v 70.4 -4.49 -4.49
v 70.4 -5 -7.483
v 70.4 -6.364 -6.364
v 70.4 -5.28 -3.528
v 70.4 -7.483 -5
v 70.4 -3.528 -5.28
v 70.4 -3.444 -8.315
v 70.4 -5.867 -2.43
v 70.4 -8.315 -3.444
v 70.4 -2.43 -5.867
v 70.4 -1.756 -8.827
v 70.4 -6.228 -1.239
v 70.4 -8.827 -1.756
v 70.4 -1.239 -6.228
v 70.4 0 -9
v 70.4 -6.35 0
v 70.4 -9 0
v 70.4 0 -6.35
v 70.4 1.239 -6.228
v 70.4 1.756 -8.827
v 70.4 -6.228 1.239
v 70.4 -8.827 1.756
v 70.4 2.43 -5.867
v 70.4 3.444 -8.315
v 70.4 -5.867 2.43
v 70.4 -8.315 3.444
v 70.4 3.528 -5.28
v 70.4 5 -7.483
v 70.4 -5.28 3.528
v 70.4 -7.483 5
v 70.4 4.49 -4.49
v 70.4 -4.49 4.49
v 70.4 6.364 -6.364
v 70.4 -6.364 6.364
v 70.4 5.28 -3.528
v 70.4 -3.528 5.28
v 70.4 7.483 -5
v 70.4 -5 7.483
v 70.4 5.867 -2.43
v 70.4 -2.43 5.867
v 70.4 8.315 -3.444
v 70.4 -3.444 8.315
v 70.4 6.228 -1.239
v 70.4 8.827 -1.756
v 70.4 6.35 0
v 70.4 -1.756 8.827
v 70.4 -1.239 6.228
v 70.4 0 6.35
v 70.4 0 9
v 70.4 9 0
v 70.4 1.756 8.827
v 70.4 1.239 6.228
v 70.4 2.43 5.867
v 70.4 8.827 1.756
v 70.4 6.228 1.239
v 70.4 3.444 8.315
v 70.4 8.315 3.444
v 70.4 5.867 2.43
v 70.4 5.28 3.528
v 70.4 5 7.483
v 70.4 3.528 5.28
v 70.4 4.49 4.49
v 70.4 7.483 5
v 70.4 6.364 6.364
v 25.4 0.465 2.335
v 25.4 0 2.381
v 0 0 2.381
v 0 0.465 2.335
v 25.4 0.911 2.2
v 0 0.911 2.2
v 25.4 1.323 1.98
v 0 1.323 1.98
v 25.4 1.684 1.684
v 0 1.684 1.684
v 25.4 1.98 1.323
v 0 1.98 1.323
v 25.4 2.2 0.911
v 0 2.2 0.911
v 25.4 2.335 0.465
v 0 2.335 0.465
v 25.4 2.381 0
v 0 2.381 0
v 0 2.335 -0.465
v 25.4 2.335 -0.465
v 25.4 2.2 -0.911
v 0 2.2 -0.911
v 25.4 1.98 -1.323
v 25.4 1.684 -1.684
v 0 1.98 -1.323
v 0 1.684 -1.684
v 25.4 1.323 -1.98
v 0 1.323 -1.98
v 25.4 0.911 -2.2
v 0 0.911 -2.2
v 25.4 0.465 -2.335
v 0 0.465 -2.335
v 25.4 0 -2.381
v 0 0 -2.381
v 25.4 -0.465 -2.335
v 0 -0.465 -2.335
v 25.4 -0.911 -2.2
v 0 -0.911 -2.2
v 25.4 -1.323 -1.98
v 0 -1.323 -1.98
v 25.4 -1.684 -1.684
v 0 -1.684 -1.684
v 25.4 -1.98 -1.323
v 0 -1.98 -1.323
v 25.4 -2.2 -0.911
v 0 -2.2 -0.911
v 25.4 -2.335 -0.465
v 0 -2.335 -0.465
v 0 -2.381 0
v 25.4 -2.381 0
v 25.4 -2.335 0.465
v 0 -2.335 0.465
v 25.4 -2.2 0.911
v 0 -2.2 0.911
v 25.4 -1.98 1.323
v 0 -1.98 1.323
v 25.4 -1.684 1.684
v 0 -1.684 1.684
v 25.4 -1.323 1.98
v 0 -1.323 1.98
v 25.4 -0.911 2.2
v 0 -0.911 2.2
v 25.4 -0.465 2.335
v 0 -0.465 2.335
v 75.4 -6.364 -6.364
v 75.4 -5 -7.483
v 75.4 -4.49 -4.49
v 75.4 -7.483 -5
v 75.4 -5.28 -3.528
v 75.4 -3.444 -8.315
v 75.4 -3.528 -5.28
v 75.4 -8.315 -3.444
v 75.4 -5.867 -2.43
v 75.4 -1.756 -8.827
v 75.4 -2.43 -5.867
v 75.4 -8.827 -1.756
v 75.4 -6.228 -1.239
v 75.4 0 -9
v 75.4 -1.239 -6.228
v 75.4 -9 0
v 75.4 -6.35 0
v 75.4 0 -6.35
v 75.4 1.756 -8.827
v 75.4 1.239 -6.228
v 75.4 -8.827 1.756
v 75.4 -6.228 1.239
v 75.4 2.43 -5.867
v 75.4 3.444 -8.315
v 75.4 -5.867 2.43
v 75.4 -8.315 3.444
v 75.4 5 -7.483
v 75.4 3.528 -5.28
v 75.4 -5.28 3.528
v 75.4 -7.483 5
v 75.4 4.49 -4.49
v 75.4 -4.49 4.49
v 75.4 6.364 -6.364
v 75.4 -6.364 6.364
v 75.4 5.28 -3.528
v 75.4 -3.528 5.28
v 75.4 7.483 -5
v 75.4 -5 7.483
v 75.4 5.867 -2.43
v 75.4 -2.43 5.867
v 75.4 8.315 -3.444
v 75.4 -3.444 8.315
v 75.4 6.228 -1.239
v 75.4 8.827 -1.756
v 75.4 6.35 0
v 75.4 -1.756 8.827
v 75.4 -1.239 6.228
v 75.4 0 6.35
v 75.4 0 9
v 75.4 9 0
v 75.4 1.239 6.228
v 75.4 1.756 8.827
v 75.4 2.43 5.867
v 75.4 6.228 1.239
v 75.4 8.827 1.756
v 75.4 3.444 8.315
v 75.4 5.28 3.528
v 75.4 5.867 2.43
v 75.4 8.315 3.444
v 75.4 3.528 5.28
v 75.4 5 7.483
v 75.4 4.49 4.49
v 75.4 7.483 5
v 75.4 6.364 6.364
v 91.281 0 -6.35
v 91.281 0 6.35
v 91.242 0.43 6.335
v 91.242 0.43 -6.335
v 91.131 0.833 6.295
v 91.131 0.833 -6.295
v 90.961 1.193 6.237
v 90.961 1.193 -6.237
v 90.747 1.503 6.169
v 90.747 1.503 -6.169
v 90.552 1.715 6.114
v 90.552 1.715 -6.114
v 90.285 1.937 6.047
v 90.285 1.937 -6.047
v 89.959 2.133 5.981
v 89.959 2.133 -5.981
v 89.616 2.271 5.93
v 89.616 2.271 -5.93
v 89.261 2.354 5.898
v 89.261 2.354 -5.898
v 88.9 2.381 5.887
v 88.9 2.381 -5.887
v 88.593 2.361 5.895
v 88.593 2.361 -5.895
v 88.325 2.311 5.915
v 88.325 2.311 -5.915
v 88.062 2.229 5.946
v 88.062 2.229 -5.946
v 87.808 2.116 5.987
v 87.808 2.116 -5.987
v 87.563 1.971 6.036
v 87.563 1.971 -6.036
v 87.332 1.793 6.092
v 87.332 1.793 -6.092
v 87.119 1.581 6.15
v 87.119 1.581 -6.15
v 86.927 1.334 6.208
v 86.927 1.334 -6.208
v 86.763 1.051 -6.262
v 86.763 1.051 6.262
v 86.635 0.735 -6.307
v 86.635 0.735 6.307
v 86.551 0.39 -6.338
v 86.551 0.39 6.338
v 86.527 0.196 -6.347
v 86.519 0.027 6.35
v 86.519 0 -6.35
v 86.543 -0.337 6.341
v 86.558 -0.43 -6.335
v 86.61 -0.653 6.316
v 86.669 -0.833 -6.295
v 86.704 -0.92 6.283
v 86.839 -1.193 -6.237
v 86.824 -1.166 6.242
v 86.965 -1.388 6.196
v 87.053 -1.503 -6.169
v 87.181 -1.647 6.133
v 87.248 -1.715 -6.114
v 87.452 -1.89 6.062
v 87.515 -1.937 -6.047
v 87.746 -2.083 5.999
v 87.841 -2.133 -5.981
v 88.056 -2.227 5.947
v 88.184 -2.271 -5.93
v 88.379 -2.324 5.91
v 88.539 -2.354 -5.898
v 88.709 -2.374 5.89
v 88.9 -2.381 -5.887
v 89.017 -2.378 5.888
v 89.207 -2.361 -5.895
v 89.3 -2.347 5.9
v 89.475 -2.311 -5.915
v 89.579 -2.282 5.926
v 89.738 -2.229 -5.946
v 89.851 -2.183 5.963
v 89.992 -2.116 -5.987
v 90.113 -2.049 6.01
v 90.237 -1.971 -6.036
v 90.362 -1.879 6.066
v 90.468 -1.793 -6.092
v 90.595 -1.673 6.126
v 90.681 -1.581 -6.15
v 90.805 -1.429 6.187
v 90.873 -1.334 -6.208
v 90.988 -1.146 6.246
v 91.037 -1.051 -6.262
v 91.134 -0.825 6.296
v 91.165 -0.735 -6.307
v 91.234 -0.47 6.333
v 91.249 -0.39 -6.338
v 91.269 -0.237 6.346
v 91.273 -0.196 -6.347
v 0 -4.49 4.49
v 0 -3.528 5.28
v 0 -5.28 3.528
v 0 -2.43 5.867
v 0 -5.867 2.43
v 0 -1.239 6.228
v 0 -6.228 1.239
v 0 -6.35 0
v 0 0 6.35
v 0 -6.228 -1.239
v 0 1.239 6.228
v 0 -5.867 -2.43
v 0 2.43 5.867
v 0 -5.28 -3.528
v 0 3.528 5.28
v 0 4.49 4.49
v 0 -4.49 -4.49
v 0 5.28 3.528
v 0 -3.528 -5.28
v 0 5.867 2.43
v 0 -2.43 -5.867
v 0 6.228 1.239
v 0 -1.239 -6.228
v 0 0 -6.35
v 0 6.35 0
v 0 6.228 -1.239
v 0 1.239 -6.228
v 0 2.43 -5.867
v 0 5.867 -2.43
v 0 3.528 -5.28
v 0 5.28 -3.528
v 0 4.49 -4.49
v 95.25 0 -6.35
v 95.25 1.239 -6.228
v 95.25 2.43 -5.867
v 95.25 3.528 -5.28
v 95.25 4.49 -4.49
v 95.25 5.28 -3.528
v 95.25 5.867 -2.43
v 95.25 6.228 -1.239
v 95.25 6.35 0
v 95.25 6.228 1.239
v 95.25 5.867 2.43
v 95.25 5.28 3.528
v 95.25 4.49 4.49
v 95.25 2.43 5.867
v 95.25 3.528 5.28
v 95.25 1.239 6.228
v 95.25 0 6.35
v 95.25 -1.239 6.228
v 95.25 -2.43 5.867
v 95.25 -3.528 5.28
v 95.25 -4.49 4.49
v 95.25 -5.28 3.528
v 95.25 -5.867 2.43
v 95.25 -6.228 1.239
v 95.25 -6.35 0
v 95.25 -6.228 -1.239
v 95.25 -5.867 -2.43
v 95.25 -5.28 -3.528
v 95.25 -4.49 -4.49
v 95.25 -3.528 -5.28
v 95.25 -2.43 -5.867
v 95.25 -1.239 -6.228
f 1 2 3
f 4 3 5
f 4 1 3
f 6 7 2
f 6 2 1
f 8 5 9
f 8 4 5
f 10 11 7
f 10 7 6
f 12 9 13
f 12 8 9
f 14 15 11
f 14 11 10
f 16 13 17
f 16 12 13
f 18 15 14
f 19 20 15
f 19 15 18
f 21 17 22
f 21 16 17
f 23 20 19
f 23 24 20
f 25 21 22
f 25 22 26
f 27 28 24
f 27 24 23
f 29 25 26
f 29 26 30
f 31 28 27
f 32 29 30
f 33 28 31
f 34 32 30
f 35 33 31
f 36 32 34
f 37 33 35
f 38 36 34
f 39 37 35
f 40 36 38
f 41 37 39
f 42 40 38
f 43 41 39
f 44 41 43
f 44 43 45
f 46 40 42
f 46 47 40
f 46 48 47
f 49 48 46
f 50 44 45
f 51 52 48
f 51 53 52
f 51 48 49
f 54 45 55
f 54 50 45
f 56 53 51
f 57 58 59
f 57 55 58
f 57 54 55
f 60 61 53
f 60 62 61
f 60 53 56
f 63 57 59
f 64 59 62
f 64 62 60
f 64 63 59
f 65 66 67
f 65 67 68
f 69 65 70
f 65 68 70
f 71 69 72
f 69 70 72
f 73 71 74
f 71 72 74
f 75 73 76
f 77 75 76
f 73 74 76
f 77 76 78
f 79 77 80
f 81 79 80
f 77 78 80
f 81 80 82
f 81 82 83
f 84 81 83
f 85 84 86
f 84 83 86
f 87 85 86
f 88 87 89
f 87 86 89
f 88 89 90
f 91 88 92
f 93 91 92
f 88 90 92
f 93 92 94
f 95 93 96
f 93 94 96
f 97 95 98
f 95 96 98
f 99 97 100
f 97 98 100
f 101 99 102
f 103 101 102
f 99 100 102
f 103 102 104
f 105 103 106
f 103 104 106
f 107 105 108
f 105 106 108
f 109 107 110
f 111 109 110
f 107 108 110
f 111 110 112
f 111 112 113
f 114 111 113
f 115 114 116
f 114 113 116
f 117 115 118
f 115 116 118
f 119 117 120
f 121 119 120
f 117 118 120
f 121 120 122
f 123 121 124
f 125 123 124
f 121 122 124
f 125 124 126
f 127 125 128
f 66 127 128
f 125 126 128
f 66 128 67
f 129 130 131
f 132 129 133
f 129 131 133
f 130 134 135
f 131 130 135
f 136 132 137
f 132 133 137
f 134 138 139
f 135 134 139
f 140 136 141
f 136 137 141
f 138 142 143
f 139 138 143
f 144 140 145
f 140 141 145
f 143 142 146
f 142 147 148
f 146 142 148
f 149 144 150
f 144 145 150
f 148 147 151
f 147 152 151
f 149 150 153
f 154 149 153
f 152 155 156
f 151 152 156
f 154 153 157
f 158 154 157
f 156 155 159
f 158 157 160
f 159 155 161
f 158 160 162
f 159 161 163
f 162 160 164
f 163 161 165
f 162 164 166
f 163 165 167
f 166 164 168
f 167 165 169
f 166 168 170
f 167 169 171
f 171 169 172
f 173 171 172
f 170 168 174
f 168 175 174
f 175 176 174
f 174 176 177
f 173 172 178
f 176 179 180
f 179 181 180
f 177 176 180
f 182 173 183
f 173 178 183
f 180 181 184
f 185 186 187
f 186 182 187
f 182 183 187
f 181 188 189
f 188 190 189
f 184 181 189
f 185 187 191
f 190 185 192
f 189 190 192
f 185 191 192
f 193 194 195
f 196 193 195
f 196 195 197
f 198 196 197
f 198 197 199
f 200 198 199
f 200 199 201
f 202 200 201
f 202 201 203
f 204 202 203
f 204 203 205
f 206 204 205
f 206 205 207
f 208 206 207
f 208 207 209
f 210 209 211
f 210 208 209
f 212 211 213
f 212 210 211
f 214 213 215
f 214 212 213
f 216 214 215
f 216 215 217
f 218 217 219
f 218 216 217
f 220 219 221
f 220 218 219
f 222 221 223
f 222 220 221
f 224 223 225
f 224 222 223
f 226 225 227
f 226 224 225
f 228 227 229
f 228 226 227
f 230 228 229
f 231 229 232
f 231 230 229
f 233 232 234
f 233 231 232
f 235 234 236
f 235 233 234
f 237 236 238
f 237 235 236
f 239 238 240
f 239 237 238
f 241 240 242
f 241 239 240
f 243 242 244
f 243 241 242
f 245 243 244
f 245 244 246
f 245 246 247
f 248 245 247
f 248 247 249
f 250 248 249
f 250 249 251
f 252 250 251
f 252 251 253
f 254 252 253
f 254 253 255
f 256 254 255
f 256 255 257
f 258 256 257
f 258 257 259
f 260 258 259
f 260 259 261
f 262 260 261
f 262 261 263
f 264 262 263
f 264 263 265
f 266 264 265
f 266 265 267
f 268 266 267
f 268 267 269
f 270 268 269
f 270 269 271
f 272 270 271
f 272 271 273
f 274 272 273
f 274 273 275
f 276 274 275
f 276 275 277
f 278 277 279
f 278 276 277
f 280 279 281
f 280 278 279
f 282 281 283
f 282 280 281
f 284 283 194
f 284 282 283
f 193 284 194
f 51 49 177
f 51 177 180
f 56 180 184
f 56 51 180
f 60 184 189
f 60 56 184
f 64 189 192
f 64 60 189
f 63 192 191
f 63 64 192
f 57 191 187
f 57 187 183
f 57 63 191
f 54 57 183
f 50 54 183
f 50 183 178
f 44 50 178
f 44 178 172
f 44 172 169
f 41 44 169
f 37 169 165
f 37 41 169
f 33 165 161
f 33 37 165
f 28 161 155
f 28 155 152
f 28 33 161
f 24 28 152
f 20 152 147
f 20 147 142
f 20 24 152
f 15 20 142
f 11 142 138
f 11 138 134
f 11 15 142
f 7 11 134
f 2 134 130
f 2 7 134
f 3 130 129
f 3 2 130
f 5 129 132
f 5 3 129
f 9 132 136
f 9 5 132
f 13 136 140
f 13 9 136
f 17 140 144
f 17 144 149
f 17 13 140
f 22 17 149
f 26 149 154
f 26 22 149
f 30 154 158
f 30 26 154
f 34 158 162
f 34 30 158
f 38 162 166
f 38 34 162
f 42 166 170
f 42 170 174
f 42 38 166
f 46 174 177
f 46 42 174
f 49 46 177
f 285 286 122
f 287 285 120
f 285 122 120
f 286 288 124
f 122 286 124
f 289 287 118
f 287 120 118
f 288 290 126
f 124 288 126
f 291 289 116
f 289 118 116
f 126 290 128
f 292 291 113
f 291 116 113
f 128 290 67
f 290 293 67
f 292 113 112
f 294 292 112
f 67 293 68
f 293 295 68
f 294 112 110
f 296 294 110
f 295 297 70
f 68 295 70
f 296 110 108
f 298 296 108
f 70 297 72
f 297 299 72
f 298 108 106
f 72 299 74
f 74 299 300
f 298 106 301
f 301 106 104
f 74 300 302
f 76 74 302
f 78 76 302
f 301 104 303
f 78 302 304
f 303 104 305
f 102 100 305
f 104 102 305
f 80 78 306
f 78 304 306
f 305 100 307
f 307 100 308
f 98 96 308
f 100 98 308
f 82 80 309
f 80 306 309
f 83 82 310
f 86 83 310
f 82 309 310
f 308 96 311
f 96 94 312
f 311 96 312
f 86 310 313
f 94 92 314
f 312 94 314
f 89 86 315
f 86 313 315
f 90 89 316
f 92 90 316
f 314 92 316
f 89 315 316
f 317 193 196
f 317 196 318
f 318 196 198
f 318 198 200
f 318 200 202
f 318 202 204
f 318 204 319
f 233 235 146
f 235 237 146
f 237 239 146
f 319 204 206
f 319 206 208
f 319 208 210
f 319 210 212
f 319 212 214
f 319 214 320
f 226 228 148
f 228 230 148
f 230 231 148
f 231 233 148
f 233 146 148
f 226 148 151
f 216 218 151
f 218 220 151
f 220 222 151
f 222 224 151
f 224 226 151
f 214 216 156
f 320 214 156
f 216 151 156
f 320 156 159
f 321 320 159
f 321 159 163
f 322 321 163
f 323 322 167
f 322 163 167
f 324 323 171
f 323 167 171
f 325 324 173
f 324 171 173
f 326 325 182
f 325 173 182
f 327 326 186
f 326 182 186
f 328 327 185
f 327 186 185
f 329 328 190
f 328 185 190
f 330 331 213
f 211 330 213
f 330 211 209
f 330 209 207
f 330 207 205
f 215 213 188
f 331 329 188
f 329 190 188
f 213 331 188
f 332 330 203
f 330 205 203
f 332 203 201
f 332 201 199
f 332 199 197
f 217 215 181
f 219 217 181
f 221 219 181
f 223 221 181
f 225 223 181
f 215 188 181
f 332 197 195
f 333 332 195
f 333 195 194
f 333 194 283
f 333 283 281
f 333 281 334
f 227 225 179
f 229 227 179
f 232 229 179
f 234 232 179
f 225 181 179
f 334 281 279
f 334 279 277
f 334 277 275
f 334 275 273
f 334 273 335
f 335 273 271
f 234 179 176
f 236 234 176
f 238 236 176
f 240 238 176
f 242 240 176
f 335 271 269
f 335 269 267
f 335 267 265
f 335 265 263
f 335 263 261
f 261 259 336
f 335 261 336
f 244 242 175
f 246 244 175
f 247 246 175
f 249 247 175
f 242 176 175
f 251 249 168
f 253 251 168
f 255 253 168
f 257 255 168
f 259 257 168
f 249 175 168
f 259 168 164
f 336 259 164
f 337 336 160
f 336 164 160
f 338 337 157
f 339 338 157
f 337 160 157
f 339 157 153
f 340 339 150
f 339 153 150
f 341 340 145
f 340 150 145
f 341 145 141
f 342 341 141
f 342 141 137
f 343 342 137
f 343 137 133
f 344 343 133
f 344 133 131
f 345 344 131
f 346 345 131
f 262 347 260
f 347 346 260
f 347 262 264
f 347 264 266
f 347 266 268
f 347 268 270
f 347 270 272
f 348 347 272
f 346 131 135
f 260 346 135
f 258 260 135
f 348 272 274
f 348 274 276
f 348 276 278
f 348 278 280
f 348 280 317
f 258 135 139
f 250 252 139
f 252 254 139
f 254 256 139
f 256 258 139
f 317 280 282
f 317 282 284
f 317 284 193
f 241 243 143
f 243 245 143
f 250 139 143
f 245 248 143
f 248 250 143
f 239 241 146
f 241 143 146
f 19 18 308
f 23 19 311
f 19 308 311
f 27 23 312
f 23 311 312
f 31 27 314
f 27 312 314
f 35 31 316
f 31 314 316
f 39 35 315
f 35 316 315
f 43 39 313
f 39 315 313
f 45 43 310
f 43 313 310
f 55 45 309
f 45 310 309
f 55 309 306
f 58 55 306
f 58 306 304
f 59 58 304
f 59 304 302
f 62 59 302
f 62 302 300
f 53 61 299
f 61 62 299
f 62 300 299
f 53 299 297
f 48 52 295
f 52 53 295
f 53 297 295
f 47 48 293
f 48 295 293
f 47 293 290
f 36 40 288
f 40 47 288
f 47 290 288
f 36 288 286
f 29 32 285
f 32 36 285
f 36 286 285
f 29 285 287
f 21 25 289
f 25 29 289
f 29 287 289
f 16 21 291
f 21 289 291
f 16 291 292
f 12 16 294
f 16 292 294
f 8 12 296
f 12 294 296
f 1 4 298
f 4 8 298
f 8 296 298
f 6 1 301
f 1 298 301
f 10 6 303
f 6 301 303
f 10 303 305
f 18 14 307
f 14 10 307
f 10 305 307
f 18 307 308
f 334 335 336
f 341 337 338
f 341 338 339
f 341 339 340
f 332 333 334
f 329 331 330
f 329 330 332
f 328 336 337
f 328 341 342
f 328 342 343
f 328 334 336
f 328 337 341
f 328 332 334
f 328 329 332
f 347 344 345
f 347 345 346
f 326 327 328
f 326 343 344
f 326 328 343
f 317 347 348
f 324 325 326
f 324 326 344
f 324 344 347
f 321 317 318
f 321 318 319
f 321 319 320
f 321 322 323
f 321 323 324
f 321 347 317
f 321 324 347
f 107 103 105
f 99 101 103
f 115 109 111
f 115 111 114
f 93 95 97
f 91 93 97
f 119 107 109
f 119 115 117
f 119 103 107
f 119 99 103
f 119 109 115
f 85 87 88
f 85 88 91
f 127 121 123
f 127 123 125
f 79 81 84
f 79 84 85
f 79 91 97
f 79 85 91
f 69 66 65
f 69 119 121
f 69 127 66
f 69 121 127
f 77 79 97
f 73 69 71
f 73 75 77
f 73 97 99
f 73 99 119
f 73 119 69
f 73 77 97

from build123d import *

# Parameters (mm, degrees)
SKETCH1_R               = 6.35
BASE_EXTRUDE_DEPTH      = 95.25
CUT_EXTRUDE1_DEPTH      = 96.672396751
CUT_EXTRUDE1_DEPTH_BACK = 96.672396751
SKETCH2_R               = 2.38125
SKETCH3_R               = 2.38125
CUT_EXTRUDE2_DEPTH      = 25.4
SKETCH4_R               = 9
EXTRUDE1_DEPTH          = 5


with BuildPart() as part:
    # Sketch1 → Base-Extrude (new body)
    with BuildSketch(Plane(origin=(0, 0, 0), x_dir=(0, 0, -1), z_dir=(1, 0, 0))):
        Circle(SKETCH1_R)
    extrude(amount=BASE_EXTRUDE_DEPTH)

    # Sketch2 → Cut-Extrude1 (cut, two sides: drawn at the far end of the back side and taken through both)
    with BuildSketch(Plane.XY.offset(-CUT_EXTRUDE1_DEPTH_BACK)):
        with Locations((88.9, 0)):
            Circle(SKETCH2_R)
    extrude(amount=CUT_EXTRUDE1_DEPTH + CUT_EXTRUDE1_DEPTH_BACK, mode=Mode.SUBTRACT)

    # Sketch3 → Cut-Extrude2 (cut)
    with BuildSketch(Plane.ZY):
        Circle(SKETCH3_R)
    extrude(amount=-CUT_EXTRUDE2_DEPTH, mode=Mode.SUBTRACT)

    # Sketch4 → Extrude1 (add)
    with BuildSketch(Plane.ZY.offset(-70.4)):
        Circle(SKETCH4_R)
    extrude(amount=-EXTRUDE1_DEPTH)


solid = part.part
